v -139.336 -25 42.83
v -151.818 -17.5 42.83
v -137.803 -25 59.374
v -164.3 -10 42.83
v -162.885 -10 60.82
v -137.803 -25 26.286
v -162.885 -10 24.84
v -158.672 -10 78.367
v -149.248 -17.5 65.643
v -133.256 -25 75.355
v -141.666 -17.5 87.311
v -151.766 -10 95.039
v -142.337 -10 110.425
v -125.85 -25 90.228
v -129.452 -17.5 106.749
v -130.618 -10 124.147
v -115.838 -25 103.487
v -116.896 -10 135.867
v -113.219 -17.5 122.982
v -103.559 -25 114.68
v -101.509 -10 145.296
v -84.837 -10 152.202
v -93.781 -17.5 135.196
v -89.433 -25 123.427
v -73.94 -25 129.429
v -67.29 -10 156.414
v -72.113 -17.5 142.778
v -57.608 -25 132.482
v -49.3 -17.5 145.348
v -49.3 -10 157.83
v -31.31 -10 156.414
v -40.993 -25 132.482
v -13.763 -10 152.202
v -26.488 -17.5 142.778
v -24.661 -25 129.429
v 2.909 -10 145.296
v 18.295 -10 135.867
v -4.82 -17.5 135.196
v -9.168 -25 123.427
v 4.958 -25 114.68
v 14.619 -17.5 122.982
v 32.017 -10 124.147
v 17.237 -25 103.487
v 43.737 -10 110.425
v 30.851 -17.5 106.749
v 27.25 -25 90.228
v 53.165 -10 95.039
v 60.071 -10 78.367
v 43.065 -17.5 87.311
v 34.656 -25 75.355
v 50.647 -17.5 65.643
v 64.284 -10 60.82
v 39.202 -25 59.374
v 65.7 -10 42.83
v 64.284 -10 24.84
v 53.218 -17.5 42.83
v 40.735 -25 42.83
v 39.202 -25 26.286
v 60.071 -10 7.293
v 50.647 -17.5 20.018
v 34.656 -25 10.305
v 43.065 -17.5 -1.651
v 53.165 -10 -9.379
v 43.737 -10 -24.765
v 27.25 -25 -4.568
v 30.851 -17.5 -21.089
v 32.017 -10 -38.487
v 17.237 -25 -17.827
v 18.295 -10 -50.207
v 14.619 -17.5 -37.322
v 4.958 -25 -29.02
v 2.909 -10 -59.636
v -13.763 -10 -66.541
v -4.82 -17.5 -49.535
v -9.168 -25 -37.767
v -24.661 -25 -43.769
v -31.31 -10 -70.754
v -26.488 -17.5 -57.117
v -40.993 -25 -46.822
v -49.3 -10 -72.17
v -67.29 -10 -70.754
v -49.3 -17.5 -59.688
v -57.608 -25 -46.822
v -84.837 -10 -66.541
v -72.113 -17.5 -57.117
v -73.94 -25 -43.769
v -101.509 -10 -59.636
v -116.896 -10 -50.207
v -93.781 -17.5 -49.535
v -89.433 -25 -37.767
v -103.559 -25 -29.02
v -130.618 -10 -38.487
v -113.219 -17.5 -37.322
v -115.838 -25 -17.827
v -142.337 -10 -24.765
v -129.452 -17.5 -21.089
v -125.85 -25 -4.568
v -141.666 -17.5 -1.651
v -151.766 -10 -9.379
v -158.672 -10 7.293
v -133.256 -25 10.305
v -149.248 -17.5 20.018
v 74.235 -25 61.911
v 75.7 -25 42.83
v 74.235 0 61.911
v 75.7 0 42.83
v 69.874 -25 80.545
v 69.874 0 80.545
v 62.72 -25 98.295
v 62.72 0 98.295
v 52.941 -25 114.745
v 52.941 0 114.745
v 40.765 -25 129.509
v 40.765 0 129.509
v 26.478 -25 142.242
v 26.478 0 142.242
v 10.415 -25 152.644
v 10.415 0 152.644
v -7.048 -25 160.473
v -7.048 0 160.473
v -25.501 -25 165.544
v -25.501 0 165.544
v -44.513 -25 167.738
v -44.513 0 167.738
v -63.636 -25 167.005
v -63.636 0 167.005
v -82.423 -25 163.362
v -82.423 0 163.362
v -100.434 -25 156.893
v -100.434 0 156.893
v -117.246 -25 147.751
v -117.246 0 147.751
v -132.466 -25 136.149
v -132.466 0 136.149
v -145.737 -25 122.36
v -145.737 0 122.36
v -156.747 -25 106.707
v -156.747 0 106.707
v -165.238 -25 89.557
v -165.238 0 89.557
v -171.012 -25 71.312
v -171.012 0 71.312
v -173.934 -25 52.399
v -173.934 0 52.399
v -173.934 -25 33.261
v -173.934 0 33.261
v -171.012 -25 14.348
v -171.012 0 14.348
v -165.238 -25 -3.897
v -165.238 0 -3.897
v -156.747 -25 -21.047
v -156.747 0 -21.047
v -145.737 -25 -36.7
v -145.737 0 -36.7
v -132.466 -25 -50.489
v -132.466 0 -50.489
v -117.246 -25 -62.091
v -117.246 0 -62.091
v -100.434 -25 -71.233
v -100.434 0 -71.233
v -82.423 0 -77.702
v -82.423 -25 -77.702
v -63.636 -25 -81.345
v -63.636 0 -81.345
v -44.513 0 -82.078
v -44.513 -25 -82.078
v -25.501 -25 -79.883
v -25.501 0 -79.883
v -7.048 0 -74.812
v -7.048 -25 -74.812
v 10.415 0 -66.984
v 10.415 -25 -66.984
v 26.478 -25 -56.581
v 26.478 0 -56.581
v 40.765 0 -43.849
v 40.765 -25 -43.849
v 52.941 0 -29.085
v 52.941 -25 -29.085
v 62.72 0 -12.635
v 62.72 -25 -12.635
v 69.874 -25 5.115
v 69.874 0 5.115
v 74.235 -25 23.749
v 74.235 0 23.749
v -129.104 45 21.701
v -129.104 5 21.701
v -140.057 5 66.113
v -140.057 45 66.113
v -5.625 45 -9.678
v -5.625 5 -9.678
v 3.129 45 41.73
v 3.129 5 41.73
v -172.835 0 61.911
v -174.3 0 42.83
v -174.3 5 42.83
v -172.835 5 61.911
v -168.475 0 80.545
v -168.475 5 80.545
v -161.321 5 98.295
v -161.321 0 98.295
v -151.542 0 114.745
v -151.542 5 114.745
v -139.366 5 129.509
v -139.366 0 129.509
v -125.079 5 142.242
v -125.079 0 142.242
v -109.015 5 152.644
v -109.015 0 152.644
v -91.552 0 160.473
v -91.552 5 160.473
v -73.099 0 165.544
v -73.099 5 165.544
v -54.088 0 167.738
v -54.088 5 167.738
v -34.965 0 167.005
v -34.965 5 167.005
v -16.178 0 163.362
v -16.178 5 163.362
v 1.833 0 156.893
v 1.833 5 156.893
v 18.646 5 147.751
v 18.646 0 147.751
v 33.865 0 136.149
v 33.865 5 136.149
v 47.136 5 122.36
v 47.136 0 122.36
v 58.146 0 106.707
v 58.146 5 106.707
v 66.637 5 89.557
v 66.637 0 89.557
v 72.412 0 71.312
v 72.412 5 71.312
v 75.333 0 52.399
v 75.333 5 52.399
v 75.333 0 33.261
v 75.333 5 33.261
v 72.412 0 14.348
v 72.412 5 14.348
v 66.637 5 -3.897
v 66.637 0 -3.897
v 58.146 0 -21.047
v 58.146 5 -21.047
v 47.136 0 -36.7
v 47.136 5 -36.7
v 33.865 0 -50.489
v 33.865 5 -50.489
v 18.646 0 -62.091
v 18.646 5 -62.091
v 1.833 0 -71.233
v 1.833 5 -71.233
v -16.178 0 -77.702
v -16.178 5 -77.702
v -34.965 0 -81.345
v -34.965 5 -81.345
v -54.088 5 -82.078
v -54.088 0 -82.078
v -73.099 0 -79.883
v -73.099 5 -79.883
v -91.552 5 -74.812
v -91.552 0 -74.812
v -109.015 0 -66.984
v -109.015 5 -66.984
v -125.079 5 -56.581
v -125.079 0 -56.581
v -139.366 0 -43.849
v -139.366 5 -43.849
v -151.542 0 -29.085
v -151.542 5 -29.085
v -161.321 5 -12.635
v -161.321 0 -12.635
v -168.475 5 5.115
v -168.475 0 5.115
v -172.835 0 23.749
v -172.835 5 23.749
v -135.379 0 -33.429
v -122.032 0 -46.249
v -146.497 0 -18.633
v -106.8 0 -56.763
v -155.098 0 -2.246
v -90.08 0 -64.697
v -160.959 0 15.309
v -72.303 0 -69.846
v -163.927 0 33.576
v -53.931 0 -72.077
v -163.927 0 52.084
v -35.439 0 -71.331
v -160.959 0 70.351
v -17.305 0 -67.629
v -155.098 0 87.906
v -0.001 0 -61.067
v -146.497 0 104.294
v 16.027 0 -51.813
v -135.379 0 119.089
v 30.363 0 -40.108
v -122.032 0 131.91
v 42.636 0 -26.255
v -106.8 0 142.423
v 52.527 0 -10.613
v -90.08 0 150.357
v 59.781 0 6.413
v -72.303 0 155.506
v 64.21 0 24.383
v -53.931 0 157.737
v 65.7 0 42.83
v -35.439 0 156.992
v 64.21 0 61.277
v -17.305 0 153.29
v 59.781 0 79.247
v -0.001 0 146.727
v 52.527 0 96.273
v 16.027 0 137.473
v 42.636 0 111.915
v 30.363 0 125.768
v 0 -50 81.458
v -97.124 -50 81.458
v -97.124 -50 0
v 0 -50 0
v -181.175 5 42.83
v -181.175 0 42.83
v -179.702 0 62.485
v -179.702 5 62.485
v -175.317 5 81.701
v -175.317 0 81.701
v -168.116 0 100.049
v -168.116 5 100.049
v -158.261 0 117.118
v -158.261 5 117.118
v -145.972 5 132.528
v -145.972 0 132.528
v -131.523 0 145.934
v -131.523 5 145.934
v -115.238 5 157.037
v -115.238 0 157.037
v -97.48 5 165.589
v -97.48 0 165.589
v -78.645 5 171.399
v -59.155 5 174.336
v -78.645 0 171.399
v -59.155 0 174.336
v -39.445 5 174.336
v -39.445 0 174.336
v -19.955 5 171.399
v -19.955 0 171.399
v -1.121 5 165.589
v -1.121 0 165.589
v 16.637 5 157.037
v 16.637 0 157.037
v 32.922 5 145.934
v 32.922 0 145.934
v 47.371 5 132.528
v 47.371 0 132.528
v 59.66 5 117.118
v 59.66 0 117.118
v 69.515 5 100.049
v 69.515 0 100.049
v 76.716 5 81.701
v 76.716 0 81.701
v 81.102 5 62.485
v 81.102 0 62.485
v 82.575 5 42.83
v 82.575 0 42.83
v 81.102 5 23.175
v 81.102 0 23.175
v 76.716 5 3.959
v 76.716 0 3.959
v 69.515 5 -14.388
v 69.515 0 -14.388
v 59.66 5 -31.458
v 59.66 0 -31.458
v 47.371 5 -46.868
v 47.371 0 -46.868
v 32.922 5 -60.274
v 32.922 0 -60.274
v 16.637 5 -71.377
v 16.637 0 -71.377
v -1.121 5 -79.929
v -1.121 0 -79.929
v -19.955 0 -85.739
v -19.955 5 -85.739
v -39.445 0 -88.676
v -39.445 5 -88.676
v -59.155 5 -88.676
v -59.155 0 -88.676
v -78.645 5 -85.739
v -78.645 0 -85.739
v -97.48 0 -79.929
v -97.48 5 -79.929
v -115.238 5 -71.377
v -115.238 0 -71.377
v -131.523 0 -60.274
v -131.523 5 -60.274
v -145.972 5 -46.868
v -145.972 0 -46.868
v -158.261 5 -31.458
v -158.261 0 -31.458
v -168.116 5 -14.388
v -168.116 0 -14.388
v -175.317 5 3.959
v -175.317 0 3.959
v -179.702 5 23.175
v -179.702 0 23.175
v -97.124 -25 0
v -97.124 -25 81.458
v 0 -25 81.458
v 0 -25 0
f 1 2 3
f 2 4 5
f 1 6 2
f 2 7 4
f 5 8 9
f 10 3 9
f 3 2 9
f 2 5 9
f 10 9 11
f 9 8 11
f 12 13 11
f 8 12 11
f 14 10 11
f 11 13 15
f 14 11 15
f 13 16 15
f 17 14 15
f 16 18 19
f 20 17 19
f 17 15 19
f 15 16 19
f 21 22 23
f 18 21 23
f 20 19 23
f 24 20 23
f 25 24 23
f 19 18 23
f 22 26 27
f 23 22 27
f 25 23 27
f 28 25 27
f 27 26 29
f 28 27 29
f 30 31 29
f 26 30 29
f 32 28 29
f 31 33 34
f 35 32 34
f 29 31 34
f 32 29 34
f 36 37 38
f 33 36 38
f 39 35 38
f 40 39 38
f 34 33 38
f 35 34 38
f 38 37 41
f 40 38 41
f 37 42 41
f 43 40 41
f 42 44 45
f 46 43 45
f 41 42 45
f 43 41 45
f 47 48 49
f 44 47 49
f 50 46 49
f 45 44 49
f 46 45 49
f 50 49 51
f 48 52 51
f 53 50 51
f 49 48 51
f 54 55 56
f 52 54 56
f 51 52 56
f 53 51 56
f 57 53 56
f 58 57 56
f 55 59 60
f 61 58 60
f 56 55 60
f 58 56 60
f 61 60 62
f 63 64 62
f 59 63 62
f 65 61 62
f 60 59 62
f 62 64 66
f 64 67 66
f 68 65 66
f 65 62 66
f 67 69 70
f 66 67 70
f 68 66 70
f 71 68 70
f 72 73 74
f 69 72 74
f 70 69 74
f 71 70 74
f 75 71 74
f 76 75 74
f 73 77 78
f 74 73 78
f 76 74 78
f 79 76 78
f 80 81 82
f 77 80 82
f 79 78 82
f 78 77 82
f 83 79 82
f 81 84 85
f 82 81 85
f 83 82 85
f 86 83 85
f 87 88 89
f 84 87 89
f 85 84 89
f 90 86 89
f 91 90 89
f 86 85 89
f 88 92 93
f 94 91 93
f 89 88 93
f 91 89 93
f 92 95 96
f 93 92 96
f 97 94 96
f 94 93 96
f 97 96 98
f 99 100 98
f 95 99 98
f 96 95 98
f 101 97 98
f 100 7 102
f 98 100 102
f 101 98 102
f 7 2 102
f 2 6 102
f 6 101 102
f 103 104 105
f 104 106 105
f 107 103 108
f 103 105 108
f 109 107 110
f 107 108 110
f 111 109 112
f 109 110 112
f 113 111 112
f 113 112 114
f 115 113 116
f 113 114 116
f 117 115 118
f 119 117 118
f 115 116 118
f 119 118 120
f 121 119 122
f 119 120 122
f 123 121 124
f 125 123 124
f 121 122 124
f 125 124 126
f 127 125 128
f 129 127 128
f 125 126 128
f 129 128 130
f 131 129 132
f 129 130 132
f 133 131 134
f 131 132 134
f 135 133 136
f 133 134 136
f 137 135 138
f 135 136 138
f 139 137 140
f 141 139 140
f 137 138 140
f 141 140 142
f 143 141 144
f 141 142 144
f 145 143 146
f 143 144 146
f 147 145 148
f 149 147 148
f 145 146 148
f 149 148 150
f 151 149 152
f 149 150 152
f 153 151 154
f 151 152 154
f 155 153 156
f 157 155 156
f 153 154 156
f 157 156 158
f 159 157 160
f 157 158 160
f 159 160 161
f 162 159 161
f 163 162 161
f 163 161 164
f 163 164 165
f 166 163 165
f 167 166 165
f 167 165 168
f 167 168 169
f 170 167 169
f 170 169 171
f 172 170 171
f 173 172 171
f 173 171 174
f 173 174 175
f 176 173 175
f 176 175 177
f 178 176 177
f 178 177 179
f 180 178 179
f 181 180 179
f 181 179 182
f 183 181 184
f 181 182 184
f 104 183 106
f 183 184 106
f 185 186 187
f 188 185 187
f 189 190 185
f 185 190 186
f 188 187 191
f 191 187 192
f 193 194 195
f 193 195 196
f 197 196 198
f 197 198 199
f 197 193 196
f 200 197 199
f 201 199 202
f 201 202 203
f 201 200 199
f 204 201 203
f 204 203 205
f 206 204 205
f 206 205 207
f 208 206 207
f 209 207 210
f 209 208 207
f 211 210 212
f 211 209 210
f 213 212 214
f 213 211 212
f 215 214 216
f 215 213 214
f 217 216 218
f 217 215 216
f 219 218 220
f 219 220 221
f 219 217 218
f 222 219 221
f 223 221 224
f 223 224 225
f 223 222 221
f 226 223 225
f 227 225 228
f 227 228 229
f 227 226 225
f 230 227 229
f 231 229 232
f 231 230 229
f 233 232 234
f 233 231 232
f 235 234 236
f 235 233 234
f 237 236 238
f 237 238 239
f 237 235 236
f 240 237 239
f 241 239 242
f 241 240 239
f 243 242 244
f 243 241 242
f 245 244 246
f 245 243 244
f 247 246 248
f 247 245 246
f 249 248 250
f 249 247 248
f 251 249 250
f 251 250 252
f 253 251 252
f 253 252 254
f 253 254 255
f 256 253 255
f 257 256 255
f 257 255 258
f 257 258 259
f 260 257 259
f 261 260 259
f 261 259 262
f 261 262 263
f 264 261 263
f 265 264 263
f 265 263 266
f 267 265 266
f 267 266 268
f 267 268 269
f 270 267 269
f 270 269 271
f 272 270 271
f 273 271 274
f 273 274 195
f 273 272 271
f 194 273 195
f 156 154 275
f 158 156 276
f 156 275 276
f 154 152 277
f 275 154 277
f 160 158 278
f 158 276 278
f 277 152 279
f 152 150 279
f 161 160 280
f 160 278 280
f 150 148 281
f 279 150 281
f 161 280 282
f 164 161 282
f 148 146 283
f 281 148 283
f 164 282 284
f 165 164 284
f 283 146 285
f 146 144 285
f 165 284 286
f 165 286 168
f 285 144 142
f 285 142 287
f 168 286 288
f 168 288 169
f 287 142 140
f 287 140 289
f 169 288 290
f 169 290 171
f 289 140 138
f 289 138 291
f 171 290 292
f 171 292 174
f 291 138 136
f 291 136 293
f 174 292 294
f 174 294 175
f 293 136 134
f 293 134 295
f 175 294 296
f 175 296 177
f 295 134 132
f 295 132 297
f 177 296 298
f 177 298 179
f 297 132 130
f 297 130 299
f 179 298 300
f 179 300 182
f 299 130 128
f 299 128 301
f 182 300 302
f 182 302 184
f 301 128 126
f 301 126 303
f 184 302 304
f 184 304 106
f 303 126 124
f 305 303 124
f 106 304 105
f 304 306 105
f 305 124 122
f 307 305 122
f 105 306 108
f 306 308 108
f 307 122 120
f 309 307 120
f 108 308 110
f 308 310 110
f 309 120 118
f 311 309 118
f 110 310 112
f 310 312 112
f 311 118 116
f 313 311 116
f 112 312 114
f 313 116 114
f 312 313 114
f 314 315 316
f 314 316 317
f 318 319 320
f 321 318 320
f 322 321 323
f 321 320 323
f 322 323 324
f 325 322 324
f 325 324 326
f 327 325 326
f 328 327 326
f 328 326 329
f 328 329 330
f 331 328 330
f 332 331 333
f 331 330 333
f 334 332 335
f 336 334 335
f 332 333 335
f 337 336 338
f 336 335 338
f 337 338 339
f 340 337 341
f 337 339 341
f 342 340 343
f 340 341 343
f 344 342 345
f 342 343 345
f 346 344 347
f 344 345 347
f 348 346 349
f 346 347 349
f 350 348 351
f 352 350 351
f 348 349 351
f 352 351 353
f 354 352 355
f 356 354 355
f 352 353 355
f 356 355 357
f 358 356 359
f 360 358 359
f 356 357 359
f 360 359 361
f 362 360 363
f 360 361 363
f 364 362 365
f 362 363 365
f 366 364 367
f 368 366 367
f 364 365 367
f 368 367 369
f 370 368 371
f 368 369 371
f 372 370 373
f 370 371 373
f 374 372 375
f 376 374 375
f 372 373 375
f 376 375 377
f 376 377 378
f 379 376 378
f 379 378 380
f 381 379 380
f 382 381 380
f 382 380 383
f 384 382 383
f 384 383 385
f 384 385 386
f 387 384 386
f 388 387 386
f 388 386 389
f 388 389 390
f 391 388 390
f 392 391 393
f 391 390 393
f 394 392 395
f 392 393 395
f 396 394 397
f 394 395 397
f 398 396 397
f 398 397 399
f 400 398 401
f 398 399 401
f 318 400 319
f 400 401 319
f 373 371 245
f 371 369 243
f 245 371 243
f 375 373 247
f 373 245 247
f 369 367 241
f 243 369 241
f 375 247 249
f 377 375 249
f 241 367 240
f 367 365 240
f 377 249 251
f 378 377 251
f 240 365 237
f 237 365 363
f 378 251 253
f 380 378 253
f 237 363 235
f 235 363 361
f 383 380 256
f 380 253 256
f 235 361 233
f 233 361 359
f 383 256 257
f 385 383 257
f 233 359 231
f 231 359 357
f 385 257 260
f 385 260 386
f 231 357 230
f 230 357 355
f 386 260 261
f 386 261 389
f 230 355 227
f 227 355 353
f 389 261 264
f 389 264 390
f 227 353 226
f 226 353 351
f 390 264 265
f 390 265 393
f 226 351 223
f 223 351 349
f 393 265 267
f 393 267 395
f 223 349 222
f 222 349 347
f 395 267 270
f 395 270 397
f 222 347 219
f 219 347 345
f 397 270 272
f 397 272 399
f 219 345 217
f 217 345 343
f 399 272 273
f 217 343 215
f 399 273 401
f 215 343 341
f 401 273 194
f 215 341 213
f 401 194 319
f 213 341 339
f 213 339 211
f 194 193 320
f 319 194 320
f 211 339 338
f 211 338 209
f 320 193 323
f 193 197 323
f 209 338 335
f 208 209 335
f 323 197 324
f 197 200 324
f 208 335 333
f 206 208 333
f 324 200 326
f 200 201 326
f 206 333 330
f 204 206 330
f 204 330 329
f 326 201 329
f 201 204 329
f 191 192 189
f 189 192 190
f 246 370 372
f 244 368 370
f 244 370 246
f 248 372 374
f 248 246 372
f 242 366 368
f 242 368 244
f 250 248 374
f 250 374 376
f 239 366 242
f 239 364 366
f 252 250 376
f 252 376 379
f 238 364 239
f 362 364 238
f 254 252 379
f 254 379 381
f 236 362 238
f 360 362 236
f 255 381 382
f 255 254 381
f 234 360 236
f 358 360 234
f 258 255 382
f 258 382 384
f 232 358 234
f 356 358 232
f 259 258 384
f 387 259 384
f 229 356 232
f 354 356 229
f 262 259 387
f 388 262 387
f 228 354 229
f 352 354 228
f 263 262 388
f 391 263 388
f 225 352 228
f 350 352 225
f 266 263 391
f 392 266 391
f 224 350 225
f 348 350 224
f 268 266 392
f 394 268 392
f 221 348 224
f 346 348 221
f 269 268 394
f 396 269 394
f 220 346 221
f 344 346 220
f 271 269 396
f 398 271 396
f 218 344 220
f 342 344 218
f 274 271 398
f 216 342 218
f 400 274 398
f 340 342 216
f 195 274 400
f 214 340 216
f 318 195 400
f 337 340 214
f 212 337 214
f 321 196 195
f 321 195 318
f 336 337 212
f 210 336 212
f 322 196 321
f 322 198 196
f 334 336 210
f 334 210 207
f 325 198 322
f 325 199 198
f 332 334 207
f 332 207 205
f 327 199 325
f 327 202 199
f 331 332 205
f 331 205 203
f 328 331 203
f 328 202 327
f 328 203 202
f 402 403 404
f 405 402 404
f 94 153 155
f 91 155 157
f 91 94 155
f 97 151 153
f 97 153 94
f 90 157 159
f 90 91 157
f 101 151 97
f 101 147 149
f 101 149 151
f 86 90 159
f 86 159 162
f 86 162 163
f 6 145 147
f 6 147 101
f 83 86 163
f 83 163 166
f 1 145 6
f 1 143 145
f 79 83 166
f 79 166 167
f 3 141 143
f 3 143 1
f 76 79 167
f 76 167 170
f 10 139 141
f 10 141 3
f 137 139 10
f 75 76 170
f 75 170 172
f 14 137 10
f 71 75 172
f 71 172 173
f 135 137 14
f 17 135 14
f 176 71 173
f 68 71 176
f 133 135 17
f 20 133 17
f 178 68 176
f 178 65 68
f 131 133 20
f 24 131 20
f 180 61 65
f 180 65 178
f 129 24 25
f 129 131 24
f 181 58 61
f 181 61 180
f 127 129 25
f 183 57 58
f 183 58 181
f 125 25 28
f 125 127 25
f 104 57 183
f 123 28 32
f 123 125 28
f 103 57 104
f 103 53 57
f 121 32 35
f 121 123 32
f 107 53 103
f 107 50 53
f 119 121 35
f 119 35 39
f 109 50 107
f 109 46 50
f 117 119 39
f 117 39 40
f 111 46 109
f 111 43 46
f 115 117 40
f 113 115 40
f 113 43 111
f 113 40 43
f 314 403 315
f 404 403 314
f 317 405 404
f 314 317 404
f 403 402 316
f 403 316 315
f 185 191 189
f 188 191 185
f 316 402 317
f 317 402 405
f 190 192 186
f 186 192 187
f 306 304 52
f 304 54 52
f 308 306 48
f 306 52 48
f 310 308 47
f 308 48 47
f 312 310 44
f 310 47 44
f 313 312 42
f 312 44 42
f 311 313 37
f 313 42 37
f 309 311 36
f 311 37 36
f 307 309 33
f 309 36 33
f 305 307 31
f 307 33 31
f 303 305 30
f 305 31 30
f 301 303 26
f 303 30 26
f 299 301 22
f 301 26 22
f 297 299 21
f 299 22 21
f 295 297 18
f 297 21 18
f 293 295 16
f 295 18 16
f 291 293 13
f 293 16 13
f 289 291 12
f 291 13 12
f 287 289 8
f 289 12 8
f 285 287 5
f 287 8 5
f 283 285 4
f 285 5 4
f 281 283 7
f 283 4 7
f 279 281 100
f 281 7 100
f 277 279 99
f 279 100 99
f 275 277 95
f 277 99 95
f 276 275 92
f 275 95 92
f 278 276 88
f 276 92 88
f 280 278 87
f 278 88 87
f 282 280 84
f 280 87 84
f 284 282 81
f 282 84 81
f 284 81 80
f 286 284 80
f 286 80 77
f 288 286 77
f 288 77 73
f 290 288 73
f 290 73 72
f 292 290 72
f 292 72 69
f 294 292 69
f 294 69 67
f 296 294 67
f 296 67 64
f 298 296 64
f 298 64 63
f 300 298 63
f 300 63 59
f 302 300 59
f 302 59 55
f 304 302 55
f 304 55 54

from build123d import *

# Parameters (mm, degrees)
F0_R      = 125
F1_DEPTH  = 150
F2_R      = 131.8750509278
F2_R_2    = 125
F3_DEPTH  = 5
F5_D      = 230
F5_DEPTH  = 10
F5_TIP    = 69.0989711882
F6_DEPTH  = 25
F7_DEPTH  = 150
F9_DEPTH  = 40
F10_W     = 97.1237495542
F10_H     = 81.4577117562
F11_DEPTH = 25


with BuildPart() as f1:
    # F0 (on Front) → F1 (new body)
    with BuildSketch(Plane.XZ):
        with Locations((-49.30036515, 42.8301356733)):
            Circle(F0_R)
    extrude(amount=F1_DEPTH)

    # F5
    with Locations(Plane(origin=(0, 0, 0), x_dir=(-1, 0, 0), z_dir=(0, 1, 0))):
        with Locations((49.30036515, 42.8301356733)):
            Hole(F5_D / 2, depth=F5_DEPTH)
            with Locations((0, 0, -(F5_DEPTH + F5_TIP / 2))):  # 118° drill point
                Cone(0, F5_D / 2, F5_TIP, mode=Mode.SUBTRACT)

    # F6 (add): a face of the model
    f6_faces = [f1.faces().sort_by_distance(p)[0] for p in [
        (-49.30036515, -150, 42.8301356733),
    ]]
    extrude(f6_faces, amount=F6_DEPTH)

    # F7 (cut): a face of the model
    f7_faces = [f1.faces().sort_by_distance(p)[0] for p in [
        (-49.30036515, -175, 42.8301356733),
    ]]
    extrude(f7_faces, amount=-F7_DEPTH, mode=Mode.SUBTRACT)


with BuildPart() as f3:
    # F2 (on face) → F3 (new body)
    with BuildSketch(Plane(origin=(0, 0, 0), x_dir=(-1, 0, 0), z_dir=(0, 1, 0))):
        with Locations((49.30036515, 42.8301356733)):
            Circle(F2_R)
        with Locations((49.30036515, 42.8301356733)):
            Circle(F2_R_2, mode=Mode.SUBTRACT)
    extrude(amount=F3_DEPTH)


with BuildPart() as f9:
    # F8 (on face) → F9 (new body)
    with BuildSketch(Plane(origin=(0, 5, 0), x_dir=(-1, 0, 0), z_dir=(0, 1, 0))):
        Polygon((129.1039586067, 21.7009484768), (140.0571018457, 66.1133304238), (-3.1293598004, 41.7301990092), (5.6249538695, -9.6782594538), align=None)
    extrude(amount=F9_DEPTH)


with BuildPart() as f11:
    # F10 (on face) → F11 (new body)
    with BuildSketch(Plane.XZ.offset(25)):
        with Locations((-48.5618747771, 40.7288558781)):
            Rectangle(F10_W, F10_H)
    extrude(amount=F11_DEPTH)


solid = Compound([f1.part, f3.part, f9.part, f11.part])
